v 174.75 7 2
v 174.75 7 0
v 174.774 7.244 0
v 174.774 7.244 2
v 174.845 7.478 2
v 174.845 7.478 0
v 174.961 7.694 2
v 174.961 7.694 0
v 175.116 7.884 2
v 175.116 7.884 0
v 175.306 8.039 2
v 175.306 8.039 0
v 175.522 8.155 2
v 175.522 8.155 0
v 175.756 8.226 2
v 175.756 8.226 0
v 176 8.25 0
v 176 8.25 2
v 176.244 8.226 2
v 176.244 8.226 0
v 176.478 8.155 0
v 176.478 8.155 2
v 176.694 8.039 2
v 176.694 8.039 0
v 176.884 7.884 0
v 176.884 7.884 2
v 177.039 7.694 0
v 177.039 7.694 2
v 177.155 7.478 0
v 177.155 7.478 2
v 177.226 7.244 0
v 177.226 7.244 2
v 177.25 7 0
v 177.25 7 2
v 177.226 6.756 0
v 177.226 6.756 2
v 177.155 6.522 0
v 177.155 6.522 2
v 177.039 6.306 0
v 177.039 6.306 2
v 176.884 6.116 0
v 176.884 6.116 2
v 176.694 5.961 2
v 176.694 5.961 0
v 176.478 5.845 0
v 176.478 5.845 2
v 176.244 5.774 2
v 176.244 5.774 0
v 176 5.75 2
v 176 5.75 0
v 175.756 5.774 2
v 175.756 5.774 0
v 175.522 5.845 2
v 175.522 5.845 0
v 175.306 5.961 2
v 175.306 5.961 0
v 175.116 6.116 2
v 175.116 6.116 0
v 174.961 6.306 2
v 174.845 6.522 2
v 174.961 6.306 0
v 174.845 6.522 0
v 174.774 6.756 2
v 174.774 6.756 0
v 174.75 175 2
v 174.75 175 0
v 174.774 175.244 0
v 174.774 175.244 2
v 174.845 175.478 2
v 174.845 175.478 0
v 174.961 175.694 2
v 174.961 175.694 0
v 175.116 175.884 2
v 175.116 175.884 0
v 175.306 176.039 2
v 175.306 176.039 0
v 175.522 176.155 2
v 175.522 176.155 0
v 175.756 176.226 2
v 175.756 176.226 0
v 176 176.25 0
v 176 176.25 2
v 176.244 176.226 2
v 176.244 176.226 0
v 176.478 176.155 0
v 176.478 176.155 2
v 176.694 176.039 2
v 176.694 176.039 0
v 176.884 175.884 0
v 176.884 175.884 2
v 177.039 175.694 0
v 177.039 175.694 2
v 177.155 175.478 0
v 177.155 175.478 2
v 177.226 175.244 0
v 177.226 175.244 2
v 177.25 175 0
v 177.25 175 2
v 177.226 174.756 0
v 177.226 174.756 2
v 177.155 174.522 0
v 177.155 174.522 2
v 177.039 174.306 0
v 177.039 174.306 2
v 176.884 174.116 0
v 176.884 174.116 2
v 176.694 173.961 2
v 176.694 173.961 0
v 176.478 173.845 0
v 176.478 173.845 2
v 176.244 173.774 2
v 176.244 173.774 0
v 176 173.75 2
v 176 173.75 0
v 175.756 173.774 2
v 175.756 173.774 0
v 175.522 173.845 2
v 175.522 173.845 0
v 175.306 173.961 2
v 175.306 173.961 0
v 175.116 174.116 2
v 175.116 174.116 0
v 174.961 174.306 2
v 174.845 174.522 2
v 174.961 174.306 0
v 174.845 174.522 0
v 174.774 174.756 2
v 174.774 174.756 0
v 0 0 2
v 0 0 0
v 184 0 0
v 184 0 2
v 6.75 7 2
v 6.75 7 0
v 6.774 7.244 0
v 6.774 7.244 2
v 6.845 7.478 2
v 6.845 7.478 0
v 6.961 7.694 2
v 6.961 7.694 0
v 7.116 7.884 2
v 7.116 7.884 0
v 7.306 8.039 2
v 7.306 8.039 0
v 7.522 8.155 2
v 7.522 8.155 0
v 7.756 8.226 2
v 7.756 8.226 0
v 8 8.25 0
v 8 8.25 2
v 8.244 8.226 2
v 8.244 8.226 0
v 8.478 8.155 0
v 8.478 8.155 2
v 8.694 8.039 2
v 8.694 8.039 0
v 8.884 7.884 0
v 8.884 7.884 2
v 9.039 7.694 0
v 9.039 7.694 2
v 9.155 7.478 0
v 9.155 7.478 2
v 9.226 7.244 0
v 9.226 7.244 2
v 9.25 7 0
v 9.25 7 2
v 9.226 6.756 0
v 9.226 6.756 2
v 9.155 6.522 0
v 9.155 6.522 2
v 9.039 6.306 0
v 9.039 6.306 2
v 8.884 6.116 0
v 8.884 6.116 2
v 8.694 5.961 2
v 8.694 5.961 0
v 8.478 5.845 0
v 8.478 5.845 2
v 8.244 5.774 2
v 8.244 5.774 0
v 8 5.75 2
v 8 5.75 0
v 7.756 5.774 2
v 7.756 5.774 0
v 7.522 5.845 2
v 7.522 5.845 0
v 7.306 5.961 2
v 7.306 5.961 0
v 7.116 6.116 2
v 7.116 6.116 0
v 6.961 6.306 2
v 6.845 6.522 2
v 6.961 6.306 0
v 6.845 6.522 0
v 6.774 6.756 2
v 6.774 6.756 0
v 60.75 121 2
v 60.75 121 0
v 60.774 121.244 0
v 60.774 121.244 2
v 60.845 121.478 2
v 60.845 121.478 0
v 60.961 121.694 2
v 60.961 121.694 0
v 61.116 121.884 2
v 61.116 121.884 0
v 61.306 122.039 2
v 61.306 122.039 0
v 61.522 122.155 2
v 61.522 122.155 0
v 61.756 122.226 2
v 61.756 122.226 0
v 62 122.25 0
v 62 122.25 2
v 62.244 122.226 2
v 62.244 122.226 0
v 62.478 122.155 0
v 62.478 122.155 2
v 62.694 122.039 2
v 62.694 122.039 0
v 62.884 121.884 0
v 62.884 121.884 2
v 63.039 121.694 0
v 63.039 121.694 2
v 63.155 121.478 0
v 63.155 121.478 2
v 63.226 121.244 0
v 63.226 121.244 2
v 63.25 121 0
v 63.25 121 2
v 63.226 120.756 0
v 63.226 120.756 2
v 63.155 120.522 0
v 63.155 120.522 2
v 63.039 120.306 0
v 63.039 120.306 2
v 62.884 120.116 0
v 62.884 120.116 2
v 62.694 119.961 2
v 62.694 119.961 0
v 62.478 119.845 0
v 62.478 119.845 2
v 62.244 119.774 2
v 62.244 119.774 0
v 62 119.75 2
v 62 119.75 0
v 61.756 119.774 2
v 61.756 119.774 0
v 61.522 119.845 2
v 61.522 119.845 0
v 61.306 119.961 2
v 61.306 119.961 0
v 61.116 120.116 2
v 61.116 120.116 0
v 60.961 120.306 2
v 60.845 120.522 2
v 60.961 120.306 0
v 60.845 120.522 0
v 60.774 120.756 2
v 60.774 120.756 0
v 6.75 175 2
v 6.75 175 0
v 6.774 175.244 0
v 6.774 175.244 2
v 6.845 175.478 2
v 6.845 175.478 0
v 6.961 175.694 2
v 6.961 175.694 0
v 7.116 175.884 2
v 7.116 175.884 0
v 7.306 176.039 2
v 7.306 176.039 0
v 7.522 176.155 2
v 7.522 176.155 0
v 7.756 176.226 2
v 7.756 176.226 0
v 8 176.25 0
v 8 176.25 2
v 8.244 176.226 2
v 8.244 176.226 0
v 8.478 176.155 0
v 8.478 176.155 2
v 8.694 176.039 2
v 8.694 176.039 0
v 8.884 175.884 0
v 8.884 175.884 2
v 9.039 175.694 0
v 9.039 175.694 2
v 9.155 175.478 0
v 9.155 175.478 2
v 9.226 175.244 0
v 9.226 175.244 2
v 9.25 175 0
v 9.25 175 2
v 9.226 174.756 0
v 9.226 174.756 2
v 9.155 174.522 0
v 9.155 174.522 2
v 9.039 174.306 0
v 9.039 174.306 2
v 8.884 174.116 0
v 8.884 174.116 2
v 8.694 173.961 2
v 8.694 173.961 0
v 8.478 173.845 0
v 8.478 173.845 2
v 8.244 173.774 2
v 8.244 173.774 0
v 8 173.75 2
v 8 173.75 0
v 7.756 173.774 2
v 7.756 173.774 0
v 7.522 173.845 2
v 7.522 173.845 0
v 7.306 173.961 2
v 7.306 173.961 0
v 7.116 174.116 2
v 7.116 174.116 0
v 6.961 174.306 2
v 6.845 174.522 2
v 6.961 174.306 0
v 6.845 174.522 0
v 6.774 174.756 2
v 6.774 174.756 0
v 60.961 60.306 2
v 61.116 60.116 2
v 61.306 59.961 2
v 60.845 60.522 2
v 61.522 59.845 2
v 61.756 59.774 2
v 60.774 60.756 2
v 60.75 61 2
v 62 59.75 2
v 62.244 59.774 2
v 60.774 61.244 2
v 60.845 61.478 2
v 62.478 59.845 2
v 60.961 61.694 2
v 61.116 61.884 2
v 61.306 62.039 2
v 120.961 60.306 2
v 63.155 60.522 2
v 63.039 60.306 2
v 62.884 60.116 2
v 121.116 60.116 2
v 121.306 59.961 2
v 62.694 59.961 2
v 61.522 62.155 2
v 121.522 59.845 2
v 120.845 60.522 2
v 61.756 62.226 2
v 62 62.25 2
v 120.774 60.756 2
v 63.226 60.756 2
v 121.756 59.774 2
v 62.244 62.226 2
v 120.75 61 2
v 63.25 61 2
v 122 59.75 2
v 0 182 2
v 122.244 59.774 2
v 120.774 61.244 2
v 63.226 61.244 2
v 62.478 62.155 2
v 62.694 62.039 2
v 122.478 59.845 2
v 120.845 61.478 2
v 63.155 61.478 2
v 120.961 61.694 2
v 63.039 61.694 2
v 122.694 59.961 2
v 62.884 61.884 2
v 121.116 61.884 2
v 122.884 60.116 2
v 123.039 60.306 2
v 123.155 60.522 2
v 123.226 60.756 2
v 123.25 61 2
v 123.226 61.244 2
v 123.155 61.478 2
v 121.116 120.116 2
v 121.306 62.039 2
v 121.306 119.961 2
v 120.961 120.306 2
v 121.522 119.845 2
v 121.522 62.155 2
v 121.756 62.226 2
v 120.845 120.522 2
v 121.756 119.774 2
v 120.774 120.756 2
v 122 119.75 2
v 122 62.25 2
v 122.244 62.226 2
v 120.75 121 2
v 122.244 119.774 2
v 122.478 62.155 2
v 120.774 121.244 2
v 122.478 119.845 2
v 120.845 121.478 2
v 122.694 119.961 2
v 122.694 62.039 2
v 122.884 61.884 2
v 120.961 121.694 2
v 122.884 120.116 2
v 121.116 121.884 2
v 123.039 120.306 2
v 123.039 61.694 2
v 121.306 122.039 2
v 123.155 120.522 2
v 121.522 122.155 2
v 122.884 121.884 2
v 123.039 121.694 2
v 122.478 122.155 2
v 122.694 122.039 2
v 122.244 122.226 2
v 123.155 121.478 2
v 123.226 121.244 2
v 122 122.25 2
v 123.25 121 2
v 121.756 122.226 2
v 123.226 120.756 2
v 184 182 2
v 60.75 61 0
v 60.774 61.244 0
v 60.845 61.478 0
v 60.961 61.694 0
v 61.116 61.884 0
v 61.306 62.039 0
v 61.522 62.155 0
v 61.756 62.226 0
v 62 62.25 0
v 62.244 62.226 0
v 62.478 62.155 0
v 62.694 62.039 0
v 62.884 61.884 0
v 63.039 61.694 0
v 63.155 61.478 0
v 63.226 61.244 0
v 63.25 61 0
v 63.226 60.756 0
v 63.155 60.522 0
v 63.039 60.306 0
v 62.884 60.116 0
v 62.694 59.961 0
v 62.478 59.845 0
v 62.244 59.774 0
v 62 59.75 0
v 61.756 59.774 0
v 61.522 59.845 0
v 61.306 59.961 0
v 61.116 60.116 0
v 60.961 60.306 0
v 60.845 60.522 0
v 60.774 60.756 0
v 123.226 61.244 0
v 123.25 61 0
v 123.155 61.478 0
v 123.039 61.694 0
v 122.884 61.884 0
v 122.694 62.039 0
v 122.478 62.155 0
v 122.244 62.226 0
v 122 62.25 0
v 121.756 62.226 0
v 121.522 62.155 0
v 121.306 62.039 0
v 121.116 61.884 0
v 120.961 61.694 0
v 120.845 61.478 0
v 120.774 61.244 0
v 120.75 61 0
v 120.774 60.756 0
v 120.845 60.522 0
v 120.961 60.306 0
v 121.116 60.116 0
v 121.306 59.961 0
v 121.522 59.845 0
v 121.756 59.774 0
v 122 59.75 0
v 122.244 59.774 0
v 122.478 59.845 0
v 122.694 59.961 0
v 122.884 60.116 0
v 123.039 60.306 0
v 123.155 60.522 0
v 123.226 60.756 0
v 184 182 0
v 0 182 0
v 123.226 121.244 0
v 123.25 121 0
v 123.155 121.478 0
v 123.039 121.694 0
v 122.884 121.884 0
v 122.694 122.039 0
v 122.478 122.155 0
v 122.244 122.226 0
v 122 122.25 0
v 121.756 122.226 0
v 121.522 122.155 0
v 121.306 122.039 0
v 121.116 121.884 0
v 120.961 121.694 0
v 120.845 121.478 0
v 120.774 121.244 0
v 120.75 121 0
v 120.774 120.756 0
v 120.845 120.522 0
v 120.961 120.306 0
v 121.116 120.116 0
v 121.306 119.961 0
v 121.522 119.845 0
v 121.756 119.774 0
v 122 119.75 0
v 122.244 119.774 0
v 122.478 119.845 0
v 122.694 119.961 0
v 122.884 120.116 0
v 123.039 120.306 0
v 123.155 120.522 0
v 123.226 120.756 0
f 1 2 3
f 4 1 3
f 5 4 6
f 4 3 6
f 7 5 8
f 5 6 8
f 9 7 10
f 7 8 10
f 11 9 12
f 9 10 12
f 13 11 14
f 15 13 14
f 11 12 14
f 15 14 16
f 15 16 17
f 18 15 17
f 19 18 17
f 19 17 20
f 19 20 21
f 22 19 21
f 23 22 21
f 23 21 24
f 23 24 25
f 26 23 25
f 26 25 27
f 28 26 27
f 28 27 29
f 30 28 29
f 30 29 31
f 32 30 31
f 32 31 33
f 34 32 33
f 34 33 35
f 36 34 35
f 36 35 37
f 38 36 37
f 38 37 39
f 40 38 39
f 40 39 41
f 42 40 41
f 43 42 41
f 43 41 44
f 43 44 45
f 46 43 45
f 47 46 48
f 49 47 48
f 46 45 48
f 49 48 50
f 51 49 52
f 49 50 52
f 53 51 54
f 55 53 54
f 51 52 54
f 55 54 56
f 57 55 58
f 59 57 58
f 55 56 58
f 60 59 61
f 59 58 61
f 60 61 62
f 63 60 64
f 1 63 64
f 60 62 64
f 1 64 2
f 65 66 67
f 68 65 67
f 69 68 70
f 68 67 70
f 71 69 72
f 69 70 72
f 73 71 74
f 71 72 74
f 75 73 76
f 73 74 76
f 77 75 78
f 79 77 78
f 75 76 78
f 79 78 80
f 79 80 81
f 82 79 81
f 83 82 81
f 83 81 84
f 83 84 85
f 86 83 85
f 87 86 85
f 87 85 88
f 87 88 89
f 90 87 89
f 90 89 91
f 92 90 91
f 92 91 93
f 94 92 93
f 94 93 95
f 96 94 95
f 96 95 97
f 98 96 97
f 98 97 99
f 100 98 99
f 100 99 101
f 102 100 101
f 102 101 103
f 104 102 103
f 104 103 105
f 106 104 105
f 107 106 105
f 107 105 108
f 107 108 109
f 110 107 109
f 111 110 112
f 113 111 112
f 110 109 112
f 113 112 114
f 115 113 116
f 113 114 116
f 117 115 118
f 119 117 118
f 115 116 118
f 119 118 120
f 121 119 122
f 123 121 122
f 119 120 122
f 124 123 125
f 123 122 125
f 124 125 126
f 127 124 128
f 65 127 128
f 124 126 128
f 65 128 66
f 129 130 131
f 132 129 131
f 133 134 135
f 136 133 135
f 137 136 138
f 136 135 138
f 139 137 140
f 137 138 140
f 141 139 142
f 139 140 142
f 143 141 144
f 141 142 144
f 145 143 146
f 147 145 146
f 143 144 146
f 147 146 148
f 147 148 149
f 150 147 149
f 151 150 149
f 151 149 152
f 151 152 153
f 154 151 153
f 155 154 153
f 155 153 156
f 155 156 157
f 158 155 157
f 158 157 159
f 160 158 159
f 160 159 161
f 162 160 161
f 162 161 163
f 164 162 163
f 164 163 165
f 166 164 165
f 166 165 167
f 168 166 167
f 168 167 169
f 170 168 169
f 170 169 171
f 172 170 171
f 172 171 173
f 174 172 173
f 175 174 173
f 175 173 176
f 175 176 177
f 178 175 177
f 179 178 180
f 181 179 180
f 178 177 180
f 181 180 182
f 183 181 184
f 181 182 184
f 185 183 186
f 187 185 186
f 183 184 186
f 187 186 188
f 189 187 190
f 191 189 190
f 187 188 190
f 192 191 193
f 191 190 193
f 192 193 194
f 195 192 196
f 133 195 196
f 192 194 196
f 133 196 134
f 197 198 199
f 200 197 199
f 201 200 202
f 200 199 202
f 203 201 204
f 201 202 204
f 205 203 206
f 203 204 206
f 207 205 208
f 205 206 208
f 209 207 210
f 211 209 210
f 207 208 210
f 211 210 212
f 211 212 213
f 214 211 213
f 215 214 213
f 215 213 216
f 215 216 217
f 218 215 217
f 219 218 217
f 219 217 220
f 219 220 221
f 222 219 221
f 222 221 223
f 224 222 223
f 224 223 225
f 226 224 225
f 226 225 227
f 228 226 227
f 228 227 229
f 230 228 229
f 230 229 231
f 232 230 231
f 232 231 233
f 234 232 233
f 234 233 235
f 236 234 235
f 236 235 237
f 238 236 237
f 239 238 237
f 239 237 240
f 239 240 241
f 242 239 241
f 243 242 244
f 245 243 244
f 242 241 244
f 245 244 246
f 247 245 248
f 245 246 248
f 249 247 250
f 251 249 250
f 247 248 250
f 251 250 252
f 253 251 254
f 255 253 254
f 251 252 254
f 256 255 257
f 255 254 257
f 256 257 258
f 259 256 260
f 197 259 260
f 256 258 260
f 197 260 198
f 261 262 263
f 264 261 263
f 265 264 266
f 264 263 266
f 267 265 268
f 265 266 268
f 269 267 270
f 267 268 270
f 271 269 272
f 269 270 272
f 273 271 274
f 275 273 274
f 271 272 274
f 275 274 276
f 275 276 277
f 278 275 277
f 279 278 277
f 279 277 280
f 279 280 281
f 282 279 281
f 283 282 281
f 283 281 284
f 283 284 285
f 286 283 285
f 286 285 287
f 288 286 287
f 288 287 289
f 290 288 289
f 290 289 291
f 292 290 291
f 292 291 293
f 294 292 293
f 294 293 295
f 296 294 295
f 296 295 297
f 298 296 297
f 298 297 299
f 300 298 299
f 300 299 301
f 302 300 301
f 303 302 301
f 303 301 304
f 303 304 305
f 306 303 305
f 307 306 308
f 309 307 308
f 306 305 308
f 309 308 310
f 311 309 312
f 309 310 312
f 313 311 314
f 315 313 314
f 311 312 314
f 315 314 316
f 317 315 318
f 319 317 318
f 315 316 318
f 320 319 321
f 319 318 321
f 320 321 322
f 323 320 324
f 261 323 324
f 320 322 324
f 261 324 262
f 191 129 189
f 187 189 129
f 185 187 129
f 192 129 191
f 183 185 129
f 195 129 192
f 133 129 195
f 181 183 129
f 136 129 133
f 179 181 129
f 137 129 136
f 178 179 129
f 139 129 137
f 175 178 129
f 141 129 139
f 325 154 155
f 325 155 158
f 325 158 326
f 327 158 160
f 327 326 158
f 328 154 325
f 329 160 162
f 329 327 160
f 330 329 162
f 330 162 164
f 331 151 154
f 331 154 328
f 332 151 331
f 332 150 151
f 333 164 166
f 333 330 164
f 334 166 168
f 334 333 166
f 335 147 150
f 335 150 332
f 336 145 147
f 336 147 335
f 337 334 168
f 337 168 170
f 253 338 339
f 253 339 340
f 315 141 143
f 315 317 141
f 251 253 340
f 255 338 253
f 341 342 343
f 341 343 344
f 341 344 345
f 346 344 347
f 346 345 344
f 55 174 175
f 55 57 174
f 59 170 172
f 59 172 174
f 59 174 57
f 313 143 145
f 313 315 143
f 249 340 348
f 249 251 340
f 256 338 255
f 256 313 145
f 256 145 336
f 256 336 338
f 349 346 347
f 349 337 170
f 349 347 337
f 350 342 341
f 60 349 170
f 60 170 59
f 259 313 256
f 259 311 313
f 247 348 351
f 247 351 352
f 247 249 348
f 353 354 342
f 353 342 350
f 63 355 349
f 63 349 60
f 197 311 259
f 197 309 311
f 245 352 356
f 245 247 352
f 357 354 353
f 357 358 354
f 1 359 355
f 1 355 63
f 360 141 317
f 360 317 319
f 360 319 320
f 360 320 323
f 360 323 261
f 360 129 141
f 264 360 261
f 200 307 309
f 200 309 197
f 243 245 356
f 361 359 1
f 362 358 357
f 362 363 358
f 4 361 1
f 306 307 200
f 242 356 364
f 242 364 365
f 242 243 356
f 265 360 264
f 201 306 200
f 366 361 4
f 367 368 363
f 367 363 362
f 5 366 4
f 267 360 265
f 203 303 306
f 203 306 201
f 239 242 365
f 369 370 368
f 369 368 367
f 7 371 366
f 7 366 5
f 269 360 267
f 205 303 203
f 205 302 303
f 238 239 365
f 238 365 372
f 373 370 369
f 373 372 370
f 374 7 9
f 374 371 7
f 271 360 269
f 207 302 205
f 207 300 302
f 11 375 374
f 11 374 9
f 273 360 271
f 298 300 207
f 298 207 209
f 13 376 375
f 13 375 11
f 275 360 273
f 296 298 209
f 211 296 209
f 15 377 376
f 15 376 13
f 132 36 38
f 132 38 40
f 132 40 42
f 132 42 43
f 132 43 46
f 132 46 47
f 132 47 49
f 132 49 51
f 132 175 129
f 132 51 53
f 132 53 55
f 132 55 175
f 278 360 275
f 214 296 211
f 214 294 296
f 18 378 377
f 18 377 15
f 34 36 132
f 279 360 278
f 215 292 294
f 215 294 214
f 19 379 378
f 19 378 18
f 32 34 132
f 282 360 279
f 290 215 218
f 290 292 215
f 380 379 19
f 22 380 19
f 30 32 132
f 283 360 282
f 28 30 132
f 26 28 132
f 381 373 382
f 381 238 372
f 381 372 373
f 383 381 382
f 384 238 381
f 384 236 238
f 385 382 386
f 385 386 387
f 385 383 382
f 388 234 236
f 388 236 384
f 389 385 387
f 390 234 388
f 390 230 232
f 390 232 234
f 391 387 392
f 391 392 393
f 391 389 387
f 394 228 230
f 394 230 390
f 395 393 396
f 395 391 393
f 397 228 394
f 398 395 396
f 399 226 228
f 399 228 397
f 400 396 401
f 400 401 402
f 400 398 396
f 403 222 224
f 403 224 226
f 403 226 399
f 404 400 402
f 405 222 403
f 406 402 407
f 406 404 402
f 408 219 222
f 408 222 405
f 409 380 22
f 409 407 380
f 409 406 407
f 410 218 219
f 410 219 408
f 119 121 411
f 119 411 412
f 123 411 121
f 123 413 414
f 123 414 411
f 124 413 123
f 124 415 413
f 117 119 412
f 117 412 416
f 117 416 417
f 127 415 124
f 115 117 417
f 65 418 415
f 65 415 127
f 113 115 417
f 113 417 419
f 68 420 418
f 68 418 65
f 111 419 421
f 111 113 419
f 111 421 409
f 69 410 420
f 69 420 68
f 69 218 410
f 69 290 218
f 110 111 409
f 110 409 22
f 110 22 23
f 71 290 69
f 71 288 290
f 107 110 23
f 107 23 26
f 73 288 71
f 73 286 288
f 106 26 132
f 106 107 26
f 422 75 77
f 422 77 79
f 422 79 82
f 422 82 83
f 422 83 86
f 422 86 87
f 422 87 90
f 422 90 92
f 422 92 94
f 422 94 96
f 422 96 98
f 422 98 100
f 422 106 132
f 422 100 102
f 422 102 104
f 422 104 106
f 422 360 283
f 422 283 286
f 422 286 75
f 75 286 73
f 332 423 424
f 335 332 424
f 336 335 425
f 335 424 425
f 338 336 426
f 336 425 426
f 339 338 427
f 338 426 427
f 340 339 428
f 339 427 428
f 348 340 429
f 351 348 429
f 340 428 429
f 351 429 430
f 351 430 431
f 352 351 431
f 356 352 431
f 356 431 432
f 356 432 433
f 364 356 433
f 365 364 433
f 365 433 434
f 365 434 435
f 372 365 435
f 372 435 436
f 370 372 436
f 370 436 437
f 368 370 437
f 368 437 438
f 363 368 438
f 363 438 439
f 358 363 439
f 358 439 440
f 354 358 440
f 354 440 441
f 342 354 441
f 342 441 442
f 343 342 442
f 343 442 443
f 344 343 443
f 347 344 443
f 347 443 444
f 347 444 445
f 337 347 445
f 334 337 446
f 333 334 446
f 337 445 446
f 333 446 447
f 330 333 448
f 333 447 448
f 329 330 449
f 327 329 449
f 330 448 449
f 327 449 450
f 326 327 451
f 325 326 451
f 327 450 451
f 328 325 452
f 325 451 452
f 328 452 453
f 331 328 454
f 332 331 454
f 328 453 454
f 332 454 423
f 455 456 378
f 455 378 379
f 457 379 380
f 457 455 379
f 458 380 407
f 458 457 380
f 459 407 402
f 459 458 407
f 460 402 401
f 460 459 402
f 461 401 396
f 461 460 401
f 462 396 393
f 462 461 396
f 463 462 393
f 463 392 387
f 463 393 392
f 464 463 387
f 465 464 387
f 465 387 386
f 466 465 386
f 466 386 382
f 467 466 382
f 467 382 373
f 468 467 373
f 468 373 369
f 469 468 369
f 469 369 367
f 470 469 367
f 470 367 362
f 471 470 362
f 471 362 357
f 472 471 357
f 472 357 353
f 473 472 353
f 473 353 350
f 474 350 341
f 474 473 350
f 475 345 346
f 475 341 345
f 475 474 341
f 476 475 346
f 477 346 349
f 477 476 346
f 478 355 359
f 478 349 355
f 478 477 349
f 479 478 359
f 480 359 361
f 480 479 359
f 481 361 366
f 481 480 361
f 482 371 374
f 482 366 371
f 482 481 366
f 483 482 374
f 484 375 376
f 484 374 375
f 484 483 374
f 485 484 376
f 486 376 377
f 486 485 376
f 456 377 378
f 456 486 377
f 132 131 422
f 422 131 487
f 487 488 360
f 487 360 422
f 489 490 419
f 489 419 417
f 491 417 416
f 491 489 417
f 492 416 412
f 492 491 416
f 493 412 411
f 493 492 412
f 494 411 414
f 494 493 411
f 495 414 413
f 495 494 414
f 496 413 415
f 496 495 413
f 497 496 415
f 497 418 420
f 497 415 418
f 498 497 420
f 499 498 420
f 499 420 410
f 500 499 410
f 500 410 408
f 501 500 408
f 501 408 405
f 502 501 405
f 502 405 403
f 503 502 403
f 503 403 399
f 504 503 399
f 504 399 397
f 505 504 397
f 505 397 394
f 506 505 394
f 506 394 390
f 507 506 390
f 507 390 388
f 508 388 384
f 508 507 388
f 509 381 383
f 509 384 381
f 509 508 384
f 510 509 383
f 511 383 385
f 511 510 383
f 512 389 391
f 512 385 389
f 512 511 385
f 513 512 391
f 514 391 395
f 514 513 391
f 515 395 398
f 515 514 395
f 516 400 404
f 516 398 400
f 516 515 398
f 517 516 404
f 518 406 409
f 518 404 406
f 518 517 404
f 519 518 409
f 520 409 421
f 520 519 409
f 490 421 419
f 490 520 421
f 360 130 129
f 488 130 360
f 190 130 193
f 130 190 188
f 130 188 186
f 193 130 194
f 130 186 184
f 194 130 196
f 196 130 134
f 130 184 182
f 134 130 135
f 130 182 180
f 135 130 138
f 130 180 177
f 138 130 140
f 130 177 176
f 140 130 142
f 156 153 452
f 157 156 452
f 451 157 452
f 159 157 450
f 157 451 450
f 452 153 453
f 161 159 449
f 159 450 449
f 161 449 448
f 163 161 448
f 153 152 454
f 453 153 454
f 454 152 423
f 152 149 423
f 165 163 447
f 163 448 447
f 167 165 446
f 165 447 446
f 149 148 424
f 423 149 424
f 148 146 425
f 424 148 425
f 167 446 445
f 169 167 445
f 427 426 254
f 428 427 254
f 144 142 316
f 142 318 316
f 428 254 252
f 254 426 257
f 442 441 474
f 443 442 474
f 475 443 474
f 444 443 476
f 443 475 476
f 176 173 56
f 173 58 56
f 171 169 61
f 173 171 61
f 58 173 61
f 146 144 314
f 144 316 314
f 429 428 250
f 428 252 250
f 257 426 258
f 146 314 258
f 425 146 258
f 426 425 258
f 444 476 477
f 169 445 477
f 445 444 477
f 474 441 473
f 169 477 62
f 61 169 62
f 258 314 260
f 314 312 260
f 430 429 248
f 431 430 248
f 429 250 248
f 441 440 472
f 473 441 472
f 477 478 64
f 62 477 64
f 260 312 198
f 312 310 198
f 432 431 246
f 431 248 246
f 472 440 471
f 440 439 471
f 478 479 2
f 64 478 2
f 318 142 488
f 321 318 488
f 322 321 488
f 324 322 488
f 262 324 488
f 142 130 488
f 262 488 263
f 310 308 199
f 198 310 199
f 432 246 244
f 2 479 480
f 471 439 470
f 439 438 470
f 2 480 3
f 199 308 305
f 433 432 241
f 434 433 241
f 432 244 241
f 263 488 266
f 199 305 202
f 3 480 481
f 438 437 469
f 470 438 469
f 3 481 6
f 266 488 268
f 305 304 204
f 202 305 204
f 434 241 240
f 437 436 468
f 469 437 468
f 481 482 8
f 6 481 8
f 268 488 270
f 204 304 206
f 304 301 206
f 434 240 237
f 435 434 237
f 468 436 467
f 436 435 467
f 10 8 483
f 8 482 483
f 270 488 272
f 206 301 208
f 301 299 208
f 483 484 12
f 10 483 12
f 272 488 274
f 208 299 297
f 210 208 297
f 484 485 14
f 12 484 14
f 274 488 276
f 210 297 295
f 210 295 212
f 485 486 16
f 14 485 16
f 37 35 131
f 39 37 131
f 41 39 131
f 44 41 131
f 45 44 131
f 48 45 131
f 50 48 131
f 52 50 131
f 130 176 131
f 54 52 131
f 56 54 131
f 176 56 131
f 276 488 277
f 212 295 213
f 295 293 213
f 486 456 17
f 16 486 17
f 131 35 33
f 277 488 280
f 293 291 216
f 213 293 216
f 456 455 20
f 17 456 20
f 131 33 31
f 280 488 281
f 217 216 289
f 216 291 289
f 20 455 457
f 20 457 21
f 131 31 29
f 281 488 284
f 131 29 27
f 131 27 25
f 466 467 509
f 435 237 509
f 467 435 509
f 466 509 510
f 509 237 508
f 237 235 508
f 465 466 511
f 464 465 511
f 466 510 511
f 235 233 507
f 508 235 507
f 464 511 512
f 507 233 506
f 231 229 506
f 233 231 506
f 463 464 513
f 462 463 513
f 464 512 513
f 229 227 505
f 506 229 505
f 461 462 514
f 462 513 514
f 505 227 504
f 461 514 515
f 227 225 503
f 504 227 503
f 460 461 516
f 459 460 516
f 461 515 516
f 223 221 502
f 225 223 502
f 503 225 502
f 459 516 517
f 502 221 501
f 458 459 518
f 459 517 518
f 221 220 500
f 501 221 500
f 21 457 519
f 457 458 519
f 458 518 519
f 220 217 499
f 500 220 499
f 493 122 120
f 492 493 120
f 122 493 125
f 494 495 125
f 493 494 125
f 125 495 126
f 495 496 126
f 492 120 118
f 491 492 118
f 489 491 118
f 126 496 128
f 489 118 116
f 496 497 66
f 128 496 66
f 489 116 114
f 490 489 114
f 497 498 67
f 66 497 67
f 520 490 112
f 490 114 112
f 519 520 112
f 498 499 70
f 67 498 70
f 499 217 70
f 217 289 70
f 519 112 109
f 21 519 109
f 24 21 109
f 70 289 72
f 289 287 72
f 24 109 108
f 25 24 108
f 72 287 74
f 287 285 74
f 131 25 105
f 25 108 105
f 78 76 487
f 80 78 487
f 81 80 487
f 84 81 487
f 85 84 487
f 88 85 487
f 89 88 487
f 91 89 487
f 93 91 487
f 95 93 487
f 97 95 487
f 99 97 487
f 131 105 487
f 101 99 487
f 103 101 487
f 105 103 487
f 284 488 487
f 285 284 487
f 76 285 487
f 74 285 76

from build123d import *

# Parameters (mm, degrees)
SKETCH_1_W      = 184
SKETCH_1_H      = 182
EXTRUDE_1_DEPTH = 2
M3X0_5_1_D      = 2.5
M3X0_5_2_D      = 2.5


with BuildPart() as part:
    # ｽｹｯﾁ1 → ﾎﾞｽ - 押し出し1 (new body)
    with BuildSketch(Plane.XY):
        with Locations((92, 91)):
            Rectangle(SKETCH_1_W, SKETCH_1_H)
    extrude(amount=EXTRUDE_1_DEPTH)

    # M3x0.5 ねじ穴1 (through all)
    with Locations(Plane.XY.offset(2)):
        with Locations((8, 175), (8, 7), (176, 7), (176, 175)):
            Hole(M3X0_5_1_D / 2)

    # M3x0.5 ねじ穴2 (through all)
    with Locations(Plane.XY.offset(2)):
        with Locations((62, 61), (62, 121)):
            m3x0_5_2 = Hole(M3X0_5_2_D / 2)

    # ﾐﾗｰ1: M3x0.5 ねじ穴2 across plane
    add(m3x0_5_2.mirror(Plane(origin=(92, 0, 0), x_dir=(0, 0, 1), z_dir=(1, 0, 0))), mode=Mode.SUBTRACT)


solid = part.part
